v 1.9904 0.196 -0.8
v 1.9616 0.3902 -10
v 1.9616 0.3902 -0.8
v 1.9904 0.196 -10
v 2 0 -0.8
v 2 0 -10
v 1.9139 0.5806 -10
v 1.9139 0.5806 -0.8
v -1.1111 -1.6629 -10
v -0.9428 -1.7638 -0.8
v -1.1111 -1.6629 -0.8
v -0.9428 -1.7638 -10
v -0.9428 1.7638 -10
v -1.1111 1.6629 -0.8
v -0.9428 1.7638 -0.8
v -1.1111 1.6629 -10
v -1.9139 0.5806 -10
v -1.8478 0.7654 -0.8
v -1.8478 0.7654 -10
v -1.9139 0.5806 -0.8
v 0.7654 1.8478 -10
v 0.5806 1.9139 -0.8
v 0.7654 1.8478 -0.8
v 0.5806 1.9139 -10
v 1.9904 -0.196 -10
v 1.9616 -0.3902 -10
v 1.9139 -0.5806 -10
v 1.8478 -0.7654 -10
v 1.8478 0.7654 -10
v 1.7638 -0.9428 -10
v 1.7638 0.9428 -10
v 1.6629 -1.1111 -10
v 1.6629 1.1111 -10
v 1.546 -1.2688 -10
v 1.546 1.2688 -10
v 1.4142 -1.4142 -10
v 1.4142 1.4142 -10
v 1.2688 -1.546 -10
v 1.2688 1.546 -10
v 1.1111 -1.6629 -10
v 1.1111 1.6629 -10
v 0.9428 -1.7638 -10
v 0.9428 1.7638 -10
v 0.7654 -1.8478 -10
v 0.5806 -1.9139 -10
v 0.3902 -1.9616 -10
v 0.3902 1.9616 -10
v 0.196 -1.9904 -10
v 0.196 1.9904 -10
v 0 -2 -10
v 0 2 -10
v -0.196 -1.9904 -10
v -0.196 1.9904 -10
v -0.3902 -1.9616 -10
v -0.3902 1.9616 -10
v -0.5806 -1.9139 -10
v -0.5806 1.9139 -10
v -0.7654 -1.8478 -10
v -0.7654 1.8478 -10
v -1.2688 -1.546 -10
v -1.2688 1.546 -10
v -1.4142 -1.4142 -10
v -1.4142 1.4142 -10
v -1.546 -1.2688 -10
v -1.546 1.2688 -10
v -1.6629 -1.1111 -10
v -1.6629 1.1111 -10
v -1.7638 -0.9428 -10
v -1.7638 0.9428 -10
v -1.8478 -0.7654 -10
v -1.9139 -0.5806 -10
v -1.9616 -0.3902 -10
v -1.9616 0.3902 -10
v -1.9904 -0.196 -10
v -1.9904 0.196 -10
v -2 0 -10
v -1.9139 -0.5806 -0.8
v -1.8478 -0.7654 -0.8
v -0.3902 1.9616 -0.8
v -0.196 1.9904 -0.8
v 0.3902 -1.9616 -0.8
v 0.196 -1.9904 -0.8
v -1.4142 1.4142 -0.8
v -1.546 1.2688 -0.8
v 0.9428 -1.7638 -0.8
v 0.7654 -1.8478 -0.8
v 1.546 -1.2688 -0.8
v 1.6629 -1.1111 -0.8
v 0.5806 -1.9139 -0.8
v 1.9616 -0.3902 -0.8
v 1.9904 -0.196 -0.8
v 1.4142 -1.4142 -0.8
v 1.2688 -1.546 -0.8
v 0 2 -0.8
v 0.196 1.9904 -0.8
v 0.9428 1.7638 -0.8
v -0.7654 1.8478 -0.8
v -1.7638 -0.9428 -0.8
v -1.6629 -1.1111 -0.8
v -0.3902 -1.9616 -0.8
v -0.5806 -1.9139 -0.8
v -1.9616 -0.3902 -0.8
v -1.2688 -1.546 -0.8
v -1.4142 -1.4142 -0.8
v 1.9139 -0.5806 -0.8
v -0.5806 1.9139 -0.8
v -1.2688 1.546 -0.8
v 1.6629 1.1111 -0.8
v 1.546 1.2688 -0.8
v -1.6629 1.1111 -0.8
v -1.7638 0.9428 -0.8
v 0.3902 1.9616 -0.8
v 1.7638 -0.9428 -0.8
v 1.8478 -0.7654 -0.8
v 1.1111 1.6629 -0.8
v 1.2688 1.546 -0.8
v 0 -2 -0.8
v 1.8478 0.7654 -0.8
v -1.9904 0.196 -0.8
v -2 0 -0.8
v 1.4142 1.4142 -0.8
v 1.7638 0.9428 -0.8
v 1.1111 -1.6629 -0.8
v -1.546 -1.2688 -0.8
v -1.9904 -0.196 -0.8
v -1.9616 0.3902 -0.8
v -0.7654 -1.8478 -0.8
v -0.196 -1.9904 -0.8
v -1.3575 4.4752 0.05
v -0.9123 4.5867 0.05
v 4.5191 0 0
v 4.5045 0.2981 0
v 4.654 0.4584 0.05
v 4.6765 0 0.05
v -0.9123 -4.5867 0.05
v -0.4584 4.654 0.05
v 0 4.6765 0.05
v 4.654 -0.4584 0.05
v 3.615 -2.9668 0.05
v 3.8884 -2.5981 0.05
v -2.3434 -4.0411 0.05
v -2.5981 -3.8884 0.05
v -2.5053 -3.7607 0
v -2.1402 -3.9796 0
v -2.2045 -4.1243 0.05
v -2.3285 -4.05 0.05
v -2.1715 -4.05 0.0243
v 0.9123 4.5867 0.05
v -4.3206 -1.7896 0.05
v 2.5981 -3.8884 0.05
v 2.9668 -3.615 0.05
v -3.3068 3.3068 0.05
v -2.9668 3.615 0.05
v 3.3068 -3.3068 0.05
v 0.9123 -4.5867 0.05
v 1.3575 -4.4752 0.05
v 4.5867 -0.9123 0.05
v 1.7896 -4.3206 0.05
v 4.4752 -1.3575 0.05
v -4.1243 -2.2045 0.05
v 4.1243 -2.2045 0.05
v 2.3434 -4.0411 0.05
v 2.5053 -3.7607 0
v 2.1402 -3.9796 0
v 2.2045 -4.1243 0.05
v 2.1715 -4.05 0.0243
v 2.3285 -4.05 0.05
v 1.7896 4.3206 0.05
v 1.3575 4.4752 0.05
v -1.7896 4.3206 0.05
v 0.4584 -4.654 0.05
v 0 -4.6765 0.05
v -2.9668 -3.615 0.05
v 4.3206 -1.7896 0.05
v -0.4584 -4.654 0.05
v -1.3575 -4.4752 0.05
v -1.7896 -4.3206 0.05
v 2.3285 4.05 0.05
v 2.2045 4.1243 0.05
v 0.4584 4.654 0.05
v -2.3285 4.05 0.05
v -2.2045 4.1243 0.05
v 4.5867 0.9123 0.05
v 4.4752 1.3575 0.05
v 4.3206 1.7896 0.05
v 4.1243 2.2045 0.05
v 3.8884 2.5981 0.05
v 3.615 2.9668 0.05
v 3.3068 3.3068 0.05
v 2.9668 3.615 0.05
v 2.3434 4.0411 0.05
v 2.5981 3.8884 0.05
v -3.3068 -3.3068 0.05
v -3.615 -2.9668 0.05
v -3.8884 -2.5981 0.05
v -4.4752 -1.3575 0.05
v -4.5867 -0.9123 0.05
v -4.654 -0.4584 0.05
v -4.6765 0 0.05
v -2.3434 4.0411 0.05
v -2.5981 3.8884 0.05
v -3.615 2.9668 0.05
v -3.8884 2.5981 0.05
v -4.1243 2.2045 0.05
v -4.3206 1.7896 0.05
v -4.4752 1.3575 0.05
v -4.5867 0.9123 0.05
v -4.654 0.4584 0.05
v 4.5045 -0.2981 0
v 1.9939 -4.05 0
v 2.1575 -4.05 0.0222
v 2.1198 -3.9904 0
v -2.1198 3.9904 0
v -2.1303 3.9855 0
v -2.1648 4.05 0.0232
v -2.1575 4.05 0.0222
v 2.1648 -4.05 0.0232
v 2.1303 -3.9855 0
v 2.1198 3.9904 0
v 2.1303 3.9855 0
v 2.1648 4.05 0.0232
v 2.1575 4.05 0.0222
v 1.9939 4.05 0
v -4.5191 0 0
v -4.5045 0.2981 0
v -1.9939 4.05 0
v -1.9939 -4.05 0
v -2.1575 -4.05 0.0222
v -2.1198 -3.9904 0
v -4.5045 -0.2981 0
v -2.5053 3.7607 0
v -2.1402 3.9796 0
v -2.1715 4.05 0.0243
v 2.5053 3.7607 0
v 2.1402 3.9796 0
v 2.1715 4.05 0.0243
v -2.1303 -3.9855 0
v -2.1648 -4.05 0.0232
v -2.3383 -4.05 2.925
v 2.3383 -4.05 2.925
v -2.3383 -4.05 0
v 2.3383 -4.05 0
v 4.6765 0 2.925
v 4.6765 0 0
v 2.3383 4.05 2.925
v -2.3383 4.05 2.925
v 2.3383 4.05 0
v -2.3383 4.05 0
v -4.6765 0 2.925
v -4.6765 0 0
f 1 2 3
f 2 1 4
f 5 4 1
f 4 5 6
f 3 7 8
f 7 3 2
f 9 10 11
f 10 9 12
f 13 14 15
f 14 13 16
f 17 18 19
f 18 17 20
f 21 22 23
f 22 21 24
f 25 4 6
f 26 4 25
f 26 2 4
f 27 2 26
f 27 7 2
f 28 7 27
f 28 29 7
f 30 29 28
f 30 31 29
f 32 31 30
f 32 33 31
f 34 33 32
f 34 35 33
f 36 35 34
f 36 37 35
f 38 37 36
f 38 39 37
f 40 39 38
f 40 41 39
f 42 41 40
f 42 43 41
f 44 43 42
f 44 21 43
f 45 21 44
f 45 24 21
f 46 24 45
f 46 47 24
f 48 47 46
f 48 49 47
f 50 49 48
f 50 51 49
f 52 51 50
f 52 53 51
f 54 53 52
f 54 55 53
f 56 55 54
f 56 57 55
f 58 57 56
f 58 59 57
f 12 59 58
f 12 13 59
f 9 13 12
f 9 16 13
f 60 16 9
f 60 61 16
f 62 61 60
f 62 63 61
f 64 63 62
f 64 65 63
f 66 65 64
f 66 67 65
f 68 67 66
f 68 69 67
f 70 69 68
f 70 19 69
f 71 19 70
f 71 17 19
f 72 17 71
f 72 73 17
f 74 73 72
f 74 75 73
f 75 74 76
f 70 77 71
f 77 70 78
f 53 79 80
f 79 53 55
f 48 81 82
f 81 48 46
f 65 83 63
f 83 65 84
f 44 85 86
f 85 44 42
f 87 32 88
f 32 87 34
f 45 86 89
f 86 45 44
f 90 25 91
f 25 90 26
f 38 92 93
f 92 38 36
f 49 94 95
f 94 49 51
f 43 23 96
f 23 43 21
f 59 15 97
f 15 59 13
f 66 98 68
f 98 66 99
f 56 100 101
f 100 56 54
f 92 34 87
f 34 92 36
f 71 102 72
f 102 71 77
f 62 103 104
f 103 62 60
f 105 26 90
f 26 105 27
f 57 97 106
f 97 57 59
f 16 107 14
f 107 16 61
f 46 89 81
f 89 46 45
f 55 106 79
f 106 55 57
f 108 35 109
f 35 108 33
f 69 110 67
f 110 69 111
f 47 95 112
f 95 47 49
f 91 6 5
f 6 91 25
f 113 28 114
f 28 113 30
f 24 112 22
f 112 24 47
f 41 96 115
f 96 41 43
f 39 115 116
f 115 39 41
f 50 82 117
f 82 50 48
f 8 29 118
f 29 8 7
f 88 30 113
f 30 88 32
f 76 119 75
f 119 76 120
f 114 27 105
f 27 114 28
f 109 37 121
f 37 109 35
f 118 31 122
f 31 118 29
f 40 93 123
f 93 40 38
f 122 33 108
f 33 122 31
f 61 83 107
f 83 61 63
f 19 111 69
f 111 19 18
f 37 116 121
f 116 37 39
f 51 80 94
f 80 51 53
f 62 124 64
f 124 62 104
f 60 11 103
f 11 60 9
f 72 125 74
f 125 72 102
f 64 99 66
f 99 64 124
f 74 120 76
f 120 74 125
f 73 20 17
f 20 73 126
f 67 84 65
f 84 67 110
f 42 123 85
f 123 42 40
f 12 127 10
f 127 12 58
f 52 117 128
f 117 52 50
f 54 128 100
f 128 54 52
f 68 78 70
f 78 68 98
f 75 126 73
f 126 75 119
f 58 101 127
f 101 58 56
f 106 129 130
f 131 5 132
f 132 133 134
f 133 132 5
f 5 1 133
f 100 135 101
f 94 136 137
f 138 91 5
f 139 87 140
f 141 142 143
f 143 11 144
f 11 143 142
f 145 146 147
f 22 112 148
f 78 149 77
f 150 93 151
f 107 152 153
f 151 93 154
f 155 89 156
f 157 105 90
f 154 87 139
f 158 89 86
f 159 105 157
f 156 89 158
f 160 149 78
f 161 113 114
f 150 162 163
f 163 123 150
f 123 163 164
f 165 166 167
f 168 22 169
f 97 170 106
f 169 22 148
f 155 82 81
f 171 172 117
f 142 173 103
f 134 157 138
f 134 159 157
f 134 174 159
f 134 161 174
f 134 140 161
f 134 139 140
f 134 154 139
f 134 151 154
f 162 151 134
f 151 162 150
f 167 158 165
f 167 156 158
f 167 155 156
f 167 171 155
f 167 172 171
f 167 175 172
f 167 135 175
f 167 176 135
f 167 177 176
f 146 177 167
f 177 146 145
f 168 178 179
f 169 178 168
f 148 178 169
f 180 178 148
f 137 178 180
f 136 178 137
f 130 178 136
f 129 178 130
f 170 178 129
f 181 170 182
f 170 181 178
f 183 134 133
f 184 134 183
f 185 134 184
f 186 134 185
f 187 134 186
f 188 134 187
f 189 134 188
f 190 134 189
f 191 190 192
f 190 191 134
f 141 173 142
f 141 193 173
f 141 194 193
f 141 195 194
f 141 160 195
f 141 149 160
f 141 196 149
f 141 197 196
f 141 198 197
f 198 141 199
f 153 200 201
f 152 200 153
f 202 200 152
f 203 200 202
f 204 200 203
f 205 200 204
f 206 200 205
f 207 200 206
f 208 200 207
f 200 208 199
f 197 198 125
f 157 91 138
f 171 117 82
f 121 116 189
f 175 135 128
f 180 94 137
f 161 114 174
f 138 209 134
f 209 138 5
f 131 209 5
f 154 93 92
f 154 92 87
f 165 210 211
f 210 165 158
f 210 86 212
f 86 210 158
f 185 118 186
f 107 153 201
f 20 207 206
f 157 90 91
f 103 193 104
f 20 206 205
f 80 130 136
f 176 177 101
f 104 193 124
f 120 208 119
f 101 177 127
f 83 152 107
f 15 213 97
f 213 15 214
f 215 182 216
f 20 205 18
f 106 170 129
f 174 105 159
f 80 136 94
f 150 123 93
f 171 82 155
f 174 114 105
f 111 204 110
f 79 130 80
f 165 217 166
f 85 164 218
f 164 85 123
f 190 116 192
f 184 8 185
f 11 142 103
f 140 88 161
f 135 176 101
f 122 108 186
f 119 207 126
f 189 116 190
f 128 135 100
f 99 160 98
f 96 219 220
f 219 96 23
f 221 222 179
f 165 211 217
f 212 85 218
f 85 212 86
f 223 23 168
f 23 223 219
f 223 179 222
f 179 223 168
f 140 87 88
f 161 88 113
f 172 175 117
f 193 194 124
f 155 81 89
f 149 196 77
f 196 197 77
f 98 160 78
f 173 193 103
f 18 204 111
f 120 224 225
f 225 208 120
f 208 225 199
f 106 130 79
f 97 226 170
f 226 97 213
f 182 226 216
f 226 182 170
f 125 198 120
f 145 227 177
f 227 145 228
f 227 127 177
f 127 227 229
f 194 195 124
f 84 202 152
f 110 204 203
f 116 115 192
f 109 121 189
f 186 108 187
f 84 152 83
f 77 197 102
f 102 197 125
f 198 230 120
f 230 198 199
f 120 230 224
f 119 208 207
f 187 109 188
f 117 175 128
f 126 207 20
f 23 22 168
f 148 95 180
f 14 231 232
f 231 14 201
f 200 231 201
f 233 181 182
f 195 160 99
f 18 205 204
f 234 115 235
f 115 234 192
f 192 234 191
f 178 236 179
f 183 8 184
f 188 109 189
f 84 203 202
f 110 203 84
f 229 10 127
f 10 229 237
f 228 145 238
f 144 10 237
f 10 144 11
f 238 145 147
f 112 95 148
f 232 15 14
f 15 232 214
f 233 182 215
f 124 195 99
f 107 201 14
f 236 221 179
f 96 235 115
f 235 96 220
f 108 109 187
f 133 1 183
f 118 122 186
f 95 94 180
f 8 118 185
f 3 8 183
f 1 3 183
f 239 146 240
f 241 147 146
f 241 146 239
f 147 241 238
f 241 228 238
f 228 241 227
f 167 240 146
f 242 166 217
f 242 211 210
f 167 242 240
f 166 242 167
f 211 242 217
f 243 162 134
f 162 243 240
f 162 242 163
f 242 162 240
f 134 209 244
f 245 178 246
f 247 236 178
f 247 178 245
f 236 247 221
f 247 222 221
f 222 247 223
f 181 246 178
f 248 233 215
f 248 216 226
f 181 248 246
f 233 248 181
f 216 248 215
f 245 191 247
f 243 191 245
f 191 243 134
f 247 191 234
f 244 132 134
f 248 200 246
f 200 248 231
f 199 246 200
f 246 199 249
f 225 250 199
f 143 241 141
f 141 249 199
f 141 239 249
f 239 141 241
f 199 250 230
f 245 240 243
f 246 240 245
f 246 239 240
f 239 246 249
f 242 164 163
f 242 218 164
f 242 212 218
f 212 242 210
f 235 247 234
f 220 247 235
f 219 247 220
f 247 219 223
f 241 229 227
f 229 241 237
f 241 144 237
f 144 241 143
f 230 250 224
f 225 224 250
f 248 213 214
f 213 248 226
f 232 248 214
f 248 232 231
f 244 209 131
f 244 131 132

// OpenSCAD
// M4x10 Hex Head Screw (single connected solid)
// Requested: 4.0mm shank diameter, 8.1mm head diameter (across flats), head height 2.925mm, length 10mm

shaft_diameter_mm   = 4.0;
overall_length_mm   = 10.0;     // length under head
head_across_flats_mm= 8.1;      // hex across flats
head_height_mm      = 2.925;

under_head_transition_height_mm = 0.8;  // small fillet-like taper (kept modest)
tip_chamfer_height_mm           = 0.6;  // small lead-in at tip
overlap_mm                      = 0.05; // tiny overlap to guarantee manifold union

$fn = 96;

module hex_head_screw() {
    head_r_circ = (head_across_flats_mm/2) / cos(30); // circumscribed radius for hex
    shank_r     = shaft_diameter_mm/2;

    union() {
        // Shank (under-head length)
        translate([0,0, -overall_length_mm])
            cylinder(h=overall_length_mm + overlap_mm, r=shank_r, $fn=64);

        // Tip chamfer (keeps overall under-head length at 10mm; chamfer is within that length)
        translate([0,0, -overall_length_mm])
            cylinder(h=tip_chamfer_height_mm, r1=0.01, r2=shank_r, $fn=64);

        // Under-head transition (taper from shank to head)
        translate([0,0, -under_head_transition_height_mm])
            cylinder(h=under_head_transition_height_mm + overlap_mm,
                     r1=shank_r, r2=head_r_circ, $fn=64);

        // Hex head (sits on z=0 plane, extends upward)
        translate([0,0, 0])
            cylinder(h=head_height_mm, r=head_r_circ, $fn=6);
    }
}

hex_head_screw();
